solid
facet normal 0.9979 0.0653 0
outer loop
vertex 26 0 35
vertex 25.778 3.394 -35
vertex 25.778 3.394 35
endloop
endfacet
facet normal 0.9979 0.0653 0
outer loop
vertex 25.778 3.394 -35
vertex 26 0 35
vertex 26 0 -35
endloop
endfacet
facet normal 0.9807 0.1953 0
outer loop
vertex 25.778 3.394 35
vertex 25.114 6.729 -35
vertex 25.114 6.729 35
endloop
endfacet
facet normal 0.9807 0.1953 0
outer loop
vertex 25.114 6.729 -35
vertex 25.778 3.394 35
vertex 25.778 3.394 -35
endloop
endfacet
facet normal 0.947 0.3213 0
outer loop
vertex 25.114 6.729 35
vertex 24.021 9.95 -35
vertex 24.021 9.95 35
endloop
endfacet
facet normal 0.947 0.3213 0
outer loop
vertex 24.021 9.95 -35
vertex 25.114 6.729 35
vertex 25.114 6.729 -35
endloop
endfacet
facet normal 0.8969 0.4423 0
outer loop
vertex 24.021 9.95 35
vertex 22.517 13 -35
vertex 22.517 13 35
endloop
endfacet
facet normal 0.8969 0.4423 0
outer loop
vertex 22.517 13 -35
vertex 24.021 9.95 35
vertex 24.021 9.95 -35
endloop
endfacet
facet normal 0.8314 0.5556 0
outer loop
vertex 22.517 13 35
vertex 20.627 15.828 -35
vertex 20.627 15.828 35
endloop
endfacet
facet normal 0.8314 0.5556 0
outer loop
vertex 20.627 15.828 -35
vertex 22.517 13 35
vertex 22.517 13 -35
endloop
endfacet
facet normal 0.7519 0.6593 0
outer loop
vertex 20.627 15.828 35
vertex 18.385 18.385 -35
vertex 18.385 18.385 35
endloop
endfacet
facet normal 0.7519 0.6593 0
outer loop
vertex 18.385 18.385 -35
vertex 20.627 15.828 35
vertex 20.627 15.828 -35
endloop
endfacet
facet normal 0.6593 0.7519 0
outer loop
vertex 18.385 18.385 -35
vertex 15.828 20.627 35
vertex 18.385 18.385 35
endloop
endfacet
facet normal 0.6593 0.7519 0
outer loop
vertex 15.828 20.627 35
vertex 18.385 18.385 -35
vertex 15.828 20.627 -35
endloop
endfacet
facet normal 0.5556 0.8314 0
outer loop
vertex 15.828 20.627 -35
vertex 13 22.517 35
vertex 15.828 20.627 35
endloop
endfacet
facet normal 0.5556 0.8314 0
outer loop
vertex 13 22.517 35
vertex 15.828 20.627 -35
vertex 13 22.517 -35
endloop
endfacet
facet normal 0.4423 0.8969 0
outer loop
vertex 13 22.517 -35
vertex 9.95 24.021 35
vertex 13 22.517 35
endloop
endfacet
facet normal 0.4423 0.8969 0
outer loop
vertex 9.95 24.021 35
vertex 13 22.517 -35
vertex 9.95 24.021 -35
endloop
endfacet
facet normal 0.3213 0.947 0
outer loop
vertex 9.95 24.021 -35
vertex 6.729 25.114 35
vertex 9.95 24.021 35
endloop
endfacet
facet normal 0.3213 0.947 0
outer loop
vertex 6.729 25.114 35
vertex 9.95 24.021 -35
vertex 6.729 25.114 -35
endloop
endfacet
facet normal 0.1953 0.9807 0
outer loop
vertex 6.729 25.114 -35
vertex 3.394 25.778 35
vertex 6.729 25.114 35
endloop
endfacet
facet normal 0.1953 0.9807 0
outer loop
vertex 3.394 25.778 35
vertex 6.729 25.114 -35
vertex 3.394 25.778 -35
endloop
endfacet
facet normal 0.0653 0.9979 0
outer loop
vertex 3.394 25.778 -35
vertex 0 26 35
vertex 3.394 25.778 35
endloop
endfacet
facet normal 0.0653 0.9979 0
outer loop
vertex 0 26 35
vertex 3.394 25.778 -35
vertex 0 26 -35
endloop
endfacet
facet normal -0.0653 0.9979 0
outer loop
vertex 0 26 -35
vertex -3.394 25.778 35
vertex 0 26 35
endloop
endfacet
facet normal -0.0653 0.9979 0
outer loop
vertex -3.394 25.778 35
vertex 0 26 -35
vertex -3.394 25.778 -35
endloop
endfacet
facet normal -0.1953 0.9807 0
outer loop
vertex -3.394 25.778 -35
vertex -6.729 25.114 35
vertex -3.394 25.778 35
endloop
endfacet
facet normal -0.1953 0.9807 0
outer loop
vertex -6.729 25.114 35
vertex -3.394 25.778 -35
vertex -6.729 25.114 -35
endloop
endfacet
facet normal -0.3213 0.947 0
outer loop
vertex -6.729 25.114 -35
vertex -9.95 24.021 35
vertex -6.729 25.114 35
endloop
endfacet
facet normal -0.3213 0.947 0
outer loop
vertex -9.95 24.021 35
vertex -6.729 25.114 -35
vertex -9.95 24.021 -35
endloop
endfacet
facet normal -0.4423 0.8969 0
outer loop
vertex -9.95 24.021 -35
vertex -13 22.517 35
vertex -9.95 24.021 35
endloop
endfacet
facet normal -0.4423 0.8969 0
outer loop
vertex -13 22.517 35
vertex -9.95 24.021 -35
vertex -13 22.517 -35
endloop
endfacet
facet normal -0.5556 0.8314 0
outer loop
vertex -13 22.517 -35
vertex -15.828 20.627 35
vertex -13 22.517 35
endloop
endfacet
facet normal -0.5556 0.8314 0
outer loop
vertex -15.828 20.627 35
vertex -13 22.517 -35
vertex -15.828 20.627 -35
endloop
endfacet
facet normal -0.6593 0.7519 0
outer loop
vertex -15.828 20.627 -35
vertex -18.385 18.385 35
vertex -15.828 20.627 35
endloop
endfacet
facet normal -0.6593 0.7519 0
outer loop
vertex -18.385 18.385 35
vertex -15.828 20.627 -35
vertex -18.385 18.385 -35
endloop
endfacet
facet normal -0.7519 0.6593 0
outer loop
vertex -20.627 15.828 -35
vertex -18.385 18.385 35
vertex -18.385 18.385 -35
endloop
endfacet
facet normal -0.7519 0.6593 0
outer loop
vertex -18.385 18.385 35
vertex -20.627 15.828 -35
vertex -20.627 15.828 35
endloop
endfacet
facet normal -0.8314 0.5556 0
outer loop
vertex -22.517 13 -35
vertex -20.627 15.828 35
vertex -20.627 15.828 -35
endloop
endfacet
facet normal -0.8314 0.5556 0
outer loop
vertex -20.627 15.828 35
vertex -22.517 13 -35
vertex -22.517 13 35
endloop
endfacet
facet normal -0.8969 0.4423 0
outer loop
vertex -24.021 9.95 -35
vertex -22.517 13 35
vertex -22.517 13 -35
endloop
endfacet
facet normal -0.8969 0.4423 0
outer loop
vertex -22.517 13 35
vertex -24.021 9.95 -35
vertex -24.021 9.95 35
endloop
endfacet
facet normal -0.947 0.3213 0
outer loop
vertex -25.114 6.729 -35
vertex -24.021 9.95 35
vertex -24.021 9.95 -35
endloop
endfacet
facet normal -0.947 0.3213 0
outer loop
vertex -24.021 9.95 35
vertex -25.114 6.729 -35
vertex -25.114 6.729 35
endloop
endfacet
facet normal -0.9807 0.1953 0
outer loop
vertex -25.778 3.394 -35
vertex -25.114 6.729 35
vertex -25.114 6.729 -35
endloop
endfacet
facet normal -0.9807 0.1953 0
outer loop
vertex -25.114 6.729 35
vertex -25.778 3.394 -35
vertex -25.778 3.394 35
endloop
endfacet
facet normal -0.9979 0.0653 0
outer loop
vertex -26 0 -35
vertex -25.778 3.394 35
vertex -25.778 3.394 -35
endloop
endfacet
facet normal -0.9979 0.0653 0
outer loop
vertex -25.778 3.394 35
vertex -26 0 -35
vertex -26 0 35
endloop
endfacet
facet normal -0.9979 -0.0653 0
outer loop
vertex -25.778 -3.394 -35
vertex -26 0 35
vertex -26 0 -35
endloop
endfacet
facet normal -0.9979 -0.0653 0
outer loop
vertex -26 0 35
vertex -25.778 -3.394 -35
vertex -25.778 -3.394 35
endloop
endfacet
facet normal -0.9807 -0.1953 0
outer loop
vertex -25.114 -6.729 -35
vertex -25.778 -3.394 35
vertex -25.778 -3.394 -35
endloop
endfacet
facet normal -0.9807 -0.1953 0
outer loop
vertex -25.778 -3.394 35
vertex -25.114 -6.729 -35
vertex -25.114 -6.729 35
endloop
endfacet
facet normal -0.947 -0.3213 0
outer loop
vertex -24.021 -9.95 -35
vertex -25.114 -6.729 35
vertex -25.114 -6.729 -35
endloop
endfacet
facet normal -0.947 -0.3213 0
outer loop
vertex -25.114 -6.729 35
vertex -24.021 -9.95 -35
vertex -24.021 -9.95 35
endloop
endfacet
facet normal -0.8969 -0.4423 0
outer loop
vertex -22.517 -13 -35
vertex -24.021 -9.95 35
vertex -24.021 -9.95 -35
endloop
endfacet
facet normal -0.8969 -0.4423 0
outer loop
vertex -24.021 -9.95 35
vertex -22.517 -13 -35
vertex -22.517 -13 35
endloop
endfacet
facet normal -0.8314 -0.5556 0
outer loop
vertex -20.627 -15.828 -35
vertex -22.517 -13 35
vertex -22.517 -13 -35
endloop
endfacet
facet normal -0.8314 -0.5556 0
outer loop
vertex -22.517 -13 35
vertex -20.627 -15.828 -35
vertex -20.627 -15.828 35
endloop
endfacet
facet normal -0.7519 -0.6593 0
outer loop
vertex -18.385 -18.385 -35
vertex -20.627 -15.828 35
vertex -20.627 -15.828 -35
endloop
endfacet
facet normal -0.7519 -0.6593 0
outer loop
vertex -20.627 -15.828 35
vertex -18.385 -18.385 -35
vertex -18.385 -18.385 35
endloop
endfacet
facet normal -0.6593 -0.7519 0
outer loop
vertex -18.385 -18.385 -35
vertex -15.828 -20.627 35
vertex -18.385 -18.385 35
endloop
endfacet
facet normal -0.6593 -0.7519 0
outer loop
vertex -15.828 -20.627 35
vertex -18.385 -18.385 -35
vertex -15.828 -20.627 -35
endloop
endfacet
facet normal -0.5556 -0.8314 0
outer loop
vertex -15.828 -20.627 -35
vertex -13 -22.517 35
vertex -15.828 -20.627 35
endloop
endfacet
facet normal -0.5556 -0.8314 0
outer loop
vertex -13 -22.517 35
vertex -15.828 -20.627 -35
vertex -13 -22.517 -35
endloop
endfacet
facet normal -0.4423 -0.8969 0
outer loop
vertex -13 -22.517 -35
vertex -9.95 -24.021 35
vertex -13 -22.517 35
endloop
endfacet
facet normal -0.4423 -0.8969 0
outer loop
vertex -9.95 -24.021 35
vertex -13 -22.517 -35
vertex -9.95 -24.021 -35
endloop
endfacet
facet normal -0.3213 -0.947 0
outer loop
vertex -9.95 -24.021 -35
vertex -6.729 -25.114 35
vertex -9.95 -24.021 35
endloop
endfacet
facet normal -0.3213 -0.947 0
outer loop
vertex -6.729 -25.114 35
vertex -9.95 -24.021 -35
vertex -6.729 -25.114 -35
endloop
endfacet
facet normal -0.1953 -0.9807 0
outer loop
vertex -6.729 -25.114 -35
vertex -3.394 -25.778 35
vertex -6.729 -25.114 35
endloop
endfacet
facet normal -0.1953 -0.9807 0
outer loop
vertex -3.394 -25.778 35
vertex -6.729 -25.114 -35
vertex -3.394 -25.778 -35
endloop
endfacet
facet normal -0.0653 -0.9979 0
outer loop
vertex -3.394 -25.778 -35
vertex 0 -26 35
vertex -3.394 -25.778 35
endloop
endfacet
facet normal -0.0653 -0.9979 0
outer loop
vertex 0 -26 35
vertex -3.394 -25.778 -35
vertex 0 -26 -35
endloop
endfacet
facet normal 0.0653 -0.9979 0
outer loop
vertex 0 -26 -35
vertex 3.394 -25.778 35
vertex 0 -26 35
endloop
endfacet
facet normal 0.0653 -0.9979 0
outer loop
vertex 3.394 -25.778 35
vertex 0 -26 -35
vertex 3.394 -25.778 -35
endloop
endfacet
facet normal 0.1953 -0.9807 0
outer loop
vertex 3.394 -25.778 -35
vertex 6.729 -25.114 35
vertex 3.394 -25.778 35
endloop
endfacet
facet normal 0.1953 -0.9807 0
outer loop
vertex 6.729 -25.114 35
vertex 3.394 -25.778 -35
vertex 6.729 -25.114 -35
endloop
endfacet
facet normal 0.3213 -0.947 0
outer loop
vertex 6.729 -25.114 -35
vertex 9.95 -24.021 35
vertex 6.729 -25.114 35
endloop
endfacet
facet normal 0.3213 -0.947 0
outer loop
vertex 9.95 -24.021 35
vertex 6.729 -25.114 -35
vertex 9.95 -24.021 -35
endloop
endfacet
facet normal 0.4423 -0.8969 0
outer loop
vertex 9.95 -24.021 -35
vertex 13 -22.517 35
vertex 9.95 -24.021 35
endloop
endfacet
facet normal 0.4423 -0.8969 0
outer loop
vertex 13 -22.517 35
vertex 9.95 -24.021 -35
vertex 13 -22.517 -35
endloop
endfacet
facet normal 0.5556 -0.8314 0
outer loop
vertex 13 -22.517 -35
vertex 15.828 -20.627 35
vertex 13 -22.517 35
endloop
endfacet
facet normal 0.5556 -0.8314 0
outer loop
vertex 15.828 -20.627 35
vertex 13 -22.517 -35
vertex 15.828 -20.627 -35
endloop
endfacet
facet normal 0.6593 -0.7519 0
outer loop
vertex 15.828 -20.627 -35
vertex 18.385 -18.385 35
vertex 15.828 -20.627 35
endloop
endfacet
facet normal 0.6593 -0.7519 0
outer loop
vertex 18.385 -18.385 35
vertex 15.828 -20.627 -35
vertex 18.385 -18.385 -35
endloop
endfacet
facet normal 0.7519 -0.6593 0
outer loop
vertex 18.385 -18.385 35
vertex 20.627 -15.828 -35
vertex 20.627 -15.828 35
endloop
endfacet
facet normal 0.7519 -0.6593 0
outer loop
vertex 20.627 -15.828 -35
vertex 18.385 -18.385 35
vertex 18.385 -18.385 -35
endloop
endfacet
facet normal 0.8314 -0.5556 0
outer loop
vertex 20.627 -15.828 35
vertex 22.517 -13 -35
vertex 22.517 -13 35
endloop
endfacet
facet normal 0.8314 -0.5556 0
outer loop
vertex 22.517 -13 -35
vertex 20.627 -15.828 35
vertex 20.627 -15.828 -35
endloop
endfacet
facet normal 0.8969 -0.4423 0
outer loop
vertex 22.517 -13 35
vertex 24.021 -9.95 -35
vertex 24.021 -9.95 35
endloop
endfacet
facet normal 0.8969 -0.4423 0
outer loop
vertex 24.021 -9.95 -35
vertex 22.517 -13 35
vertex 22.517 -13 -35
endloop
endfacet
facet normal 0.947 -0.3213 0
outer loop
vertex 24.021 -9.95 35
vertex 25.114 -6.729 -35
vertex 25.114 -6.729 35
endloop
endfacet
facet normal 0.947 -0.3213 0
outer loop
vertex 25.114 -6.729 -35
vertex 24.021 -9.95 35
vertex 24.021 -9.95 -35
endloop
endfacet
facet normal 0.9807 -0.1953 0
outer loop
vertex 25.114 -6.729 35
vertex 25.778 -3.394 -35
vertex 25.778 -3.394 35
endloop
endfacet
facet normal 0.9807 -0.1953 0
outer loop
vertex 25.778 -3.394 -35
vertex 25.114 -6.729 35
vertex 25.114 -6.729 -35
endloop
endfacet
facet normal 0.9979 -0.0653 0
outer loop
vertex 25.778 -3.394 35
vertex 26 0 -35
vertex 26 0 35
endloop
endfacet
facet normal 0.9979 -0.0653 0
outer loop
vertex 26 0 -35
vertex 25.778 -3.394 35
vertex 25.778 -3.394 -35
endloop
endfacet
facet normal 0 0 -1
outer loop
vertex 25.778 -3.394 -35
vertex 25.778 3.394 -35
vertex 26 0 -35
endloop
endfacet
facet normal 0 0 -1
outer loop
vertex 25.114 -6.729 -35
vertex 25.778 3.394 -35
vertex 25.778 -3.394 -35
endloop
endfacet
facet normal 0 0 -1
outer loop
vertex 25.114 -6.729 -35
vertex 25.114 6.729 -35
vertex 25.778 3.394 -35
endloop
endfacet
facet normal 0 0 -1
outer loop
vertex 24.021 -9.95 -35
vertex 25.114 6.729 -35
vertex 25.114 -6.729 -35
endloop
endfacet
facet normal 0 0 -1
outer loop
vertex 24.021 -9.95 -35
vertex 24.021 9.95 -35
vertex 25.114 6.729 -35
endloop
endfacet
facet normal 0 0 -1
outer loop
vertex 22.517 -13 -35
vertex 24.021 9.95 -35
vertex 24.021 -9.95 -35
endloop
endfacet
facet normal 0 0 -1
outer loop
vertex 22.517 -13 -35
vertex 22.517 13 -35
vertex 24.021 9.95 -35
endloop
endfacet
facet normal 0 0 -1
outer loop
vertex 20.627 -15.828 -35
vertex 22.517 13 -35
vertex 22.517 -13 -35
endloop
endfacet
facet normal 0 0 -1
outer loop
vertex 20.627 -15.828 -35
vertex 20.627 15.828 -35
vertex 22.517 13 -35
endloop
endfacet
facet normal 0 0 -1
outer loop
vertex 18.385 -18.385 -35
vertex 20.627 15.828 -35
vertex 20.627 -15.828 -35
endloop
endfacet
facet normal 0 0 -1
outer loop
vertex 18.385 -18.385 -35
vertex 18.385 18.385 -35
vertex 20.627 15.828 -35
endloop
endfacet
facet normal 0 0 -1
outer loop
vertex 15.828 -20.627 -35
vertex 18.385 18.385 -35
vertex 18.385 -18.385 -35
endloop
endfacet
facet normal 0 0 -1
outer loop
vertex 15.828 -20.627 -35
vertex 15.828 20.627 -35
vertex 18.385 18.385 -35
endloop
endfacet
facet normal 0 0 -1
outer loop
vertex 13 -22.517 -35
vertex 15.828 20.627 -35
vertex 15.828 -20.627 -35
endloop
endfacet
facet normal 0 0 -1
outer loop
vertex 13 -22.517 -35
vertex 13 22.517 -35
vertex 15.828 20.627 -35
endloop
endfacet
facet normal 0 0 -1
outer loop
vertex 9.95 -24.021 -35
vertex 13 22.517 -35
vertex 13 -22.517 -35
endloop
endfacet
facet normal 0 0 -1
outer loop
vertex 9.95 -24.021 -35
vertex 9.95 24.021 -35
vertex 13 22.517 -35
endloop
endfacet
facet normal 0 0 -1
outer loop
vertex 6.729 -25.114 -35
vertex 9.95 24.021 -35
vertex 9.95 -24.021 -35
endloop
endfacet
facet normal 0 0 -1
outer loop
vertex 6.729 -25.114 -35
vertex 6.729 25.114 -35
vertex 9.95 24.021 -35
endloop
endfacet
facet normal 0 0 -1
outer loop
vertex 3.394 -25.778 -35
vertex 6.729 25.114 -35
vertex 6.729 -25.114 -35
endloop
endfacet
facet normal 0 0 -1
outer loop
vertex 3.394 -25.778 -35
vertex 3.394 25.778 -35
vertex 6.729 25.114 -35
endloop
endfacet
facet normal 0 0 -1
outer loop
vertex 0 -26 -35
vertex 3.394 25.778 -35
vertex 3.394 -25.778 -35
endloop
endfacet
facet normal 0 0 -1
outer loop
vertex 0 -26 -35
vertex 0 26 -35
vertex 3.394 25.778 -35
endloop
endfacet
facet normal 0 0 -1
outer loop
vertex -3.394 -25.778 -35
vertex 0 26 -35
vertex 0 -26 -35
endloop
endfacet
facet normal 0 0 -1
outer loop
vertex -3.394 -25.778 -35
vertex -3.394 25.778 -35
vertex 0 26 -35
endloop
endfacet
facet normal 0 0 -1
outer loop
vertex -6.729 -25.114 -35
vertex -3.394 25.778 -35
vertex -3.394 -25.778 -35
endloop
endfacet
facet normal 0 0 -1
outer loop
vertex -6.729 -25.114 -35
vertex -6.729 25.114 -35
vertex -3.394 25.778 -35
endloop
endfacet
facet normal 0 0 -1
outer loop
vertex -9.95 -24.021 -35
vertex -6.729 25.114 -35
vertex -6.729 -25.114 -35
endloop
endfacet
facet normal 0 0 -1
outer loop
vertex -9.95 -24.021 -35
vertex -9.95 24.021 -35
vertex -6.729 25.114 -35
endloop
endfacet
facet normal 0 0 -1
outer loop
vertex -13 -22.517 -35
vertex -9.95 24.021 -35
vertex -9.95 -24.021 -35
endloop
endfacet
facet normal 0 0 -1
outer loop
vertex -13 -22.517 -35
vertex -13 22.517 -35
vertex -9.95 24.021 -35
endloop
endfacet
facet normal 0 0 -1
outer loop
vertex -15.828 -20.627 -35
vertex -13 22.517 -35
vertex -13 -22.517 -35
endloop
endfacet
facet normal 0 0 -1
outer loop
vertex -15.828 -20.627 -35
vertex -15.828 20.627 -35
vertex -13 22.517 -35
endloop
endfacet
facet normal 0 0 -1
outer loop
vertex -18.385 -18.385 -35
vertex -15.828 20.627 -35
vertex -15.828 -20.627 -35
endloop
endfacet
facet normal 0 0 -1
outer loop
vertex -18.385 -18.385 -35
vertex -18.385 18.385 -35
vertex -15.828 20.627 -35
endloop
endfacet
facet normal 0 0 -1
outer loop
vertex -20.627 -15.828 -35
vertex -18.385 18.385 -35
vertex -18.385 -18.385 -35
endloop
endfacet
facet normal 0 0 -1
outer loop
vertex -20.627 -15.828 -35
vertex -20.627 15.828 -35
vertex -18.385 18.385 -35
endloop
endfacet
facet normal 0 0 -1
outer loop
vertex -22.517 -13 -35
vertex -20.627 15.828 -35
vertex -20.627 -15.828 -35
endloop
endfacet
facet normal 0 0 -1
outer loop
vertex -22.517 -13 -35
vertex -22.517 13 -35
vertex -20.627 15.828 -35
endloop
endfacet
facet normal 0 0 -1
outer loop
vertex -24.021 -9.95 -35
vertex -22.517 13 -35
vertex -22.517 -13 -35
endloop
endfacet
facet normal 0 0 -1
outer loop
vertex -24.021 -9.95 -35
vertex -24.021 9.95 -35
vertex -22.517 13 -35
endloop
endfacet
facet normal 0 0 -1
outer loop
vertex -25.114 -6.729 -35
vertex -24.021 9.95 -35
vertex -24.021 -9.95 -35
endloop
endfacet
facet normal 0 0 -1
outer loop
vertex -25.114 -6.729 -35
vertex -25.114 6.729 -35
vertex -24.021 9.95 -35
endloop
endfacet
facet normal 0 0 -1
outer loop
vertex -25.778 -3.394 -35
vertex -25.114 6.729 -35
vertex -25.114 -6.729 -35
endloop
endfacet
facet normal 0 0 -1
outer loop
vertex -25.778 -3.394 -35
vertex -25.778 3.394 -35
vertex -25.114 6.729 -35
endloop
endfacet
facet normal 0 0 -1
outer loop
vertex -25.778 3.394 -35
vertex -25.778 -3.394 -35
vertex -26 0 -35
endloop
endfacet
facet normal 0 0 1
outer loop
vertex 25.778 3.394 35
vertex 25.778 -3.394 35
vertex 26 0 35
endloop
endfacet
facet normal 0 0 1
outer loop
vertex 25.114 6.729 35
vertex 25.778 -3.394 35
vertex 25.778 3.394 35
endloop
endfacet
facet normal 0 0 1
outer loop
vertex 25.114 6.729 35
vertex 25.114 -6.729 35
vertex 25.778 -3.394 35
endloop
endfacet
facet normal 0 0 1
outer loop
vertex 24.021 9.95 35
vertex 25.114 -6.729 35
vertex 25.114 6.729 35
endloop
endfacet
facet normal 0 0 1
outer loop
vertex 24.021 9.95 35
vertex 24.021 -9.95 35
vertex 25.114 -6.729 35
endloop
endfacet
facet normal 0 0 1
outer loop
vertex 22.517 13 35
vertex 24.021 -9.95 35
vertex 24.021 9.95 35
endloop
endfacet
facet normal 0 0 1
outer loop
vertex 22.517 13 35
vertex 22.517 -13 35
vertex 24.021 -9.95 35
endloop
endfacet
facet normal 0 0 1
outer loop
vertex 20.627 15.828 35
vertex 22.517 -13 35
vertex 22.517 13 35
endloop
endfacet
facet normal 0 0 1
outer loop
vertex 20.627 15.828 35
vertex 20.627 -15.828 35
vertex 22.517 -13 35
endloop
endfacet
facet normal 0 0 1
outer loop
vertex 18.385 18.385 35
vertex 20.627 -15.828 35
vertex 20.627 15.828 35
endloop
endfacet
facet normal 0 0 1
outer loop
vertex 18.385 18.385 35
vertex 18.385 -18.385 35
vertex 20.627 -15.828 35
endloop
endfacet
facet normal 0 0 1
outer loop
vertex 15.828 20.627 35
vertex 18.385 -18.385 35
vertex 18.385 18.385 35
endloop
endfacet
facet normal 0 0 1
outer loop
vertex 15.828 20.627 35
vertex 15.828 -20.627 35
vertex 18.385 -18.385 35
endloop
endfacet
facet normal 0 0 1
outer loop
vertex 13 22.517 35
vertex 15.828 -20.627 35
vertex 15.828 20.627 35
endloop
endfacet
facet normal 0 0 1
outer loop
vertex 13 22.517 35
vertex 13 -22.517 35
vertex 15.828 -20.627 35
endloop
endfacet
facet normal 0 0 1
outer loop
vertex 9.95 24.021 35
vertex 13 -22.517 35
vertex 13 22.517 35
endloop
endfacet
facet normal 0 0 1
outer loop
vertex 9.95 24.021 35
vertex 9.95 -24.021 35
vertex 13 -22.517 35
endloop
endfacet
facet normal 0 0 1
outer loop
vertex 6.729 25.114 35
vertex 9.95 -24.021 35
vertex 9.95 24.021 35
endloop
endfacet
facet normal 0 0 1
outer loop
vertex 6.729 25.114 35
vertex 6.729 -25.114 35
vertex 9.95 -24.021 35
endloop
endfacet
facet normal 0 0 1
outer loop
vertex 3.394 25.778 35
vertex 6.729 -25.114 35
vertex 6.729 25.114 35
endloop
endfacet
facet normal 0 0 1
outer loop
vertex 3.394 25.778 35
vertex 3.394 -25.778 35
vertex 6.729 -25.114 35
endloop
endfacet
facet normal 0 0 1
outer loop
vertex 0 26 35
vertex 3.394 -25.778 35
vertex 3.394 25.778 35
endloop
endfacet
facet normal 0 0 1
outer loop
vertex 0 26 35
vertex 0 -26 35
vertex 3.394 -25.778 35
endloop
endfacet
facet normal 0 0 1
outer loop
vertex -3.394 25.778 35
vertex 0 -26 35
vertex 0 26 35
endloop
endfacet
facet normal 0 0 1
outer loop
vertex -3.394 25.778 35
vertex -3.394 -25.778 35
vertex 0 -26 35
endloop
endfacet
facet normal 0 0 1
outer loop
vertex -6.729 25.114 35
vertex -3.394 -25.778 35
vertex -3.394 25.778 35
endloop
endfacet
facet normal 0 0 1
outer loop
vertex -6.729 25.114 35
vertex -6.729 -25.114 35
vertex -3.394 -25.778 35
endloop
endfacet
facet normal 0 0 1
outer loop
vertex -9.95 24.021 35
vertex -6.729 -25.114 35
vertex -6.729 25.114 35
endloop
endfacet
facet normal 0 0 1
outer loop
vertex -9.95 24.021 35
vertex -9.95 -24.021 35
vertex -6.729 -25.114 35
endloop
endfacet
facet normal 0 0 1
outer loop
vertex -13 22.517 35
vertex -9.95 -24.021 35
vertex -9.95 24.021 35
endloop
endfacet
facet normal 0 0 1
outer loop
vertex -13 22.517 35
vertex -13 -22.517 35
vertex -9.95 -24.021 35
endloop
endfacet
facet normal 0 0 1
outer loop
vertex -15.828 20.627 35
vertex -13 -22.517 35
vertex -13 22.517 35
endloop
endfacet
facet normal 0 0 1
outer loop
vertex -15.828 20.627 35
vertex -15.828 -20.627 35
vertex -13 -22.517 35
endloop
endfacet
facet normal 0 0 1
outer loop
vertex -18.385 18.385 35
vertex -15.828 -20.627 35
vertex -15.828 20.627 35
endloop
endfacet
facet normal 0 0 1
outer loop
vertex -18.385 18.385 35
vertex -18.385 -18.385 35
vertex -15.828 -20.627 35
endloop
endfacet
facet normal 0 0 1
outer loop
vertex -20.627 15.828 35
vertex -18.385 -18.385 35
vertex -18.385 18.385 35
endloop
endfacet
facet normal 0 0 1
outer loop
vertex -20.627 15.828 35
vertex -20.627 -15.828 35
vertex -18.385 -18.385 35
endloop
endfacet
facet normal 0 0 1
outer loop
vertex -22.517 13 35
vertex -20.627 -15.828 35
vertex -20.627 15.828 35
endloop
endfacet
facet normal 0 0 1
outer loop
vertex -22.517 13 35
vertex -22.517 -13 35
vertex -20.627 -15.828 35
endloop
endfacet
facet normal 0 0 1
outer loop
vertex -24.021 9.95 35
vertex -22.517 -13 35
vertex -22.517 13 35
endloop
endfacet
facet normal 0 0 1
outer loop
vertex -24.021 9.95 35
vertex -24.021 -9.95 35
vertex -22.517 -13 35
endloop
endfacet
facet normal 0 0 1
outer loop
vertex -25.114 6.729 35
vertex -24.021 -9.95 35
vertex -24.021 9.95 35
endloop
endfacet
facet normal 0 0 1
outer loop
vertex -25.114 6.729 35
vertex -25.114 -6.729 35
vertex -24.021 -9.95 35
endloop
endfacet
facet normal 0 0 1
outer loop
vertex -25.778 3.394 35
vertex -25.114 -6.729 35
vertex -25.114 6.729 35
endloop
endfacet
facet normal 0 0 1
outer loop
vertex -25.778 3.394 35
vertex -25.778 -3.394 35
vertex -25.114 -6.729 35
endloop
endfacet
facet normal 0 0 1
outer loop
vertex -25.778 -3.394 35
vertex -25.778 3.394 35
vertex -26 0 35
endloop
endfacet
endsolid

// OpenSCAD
// ========================================
// a cylinder with radius 26 mm and height 70 mm
// NeuroCAD canonical IR; dimensions are millimetres
// ========================================
$fn = 48;

cylinder(r=26, h=70, center=true);
